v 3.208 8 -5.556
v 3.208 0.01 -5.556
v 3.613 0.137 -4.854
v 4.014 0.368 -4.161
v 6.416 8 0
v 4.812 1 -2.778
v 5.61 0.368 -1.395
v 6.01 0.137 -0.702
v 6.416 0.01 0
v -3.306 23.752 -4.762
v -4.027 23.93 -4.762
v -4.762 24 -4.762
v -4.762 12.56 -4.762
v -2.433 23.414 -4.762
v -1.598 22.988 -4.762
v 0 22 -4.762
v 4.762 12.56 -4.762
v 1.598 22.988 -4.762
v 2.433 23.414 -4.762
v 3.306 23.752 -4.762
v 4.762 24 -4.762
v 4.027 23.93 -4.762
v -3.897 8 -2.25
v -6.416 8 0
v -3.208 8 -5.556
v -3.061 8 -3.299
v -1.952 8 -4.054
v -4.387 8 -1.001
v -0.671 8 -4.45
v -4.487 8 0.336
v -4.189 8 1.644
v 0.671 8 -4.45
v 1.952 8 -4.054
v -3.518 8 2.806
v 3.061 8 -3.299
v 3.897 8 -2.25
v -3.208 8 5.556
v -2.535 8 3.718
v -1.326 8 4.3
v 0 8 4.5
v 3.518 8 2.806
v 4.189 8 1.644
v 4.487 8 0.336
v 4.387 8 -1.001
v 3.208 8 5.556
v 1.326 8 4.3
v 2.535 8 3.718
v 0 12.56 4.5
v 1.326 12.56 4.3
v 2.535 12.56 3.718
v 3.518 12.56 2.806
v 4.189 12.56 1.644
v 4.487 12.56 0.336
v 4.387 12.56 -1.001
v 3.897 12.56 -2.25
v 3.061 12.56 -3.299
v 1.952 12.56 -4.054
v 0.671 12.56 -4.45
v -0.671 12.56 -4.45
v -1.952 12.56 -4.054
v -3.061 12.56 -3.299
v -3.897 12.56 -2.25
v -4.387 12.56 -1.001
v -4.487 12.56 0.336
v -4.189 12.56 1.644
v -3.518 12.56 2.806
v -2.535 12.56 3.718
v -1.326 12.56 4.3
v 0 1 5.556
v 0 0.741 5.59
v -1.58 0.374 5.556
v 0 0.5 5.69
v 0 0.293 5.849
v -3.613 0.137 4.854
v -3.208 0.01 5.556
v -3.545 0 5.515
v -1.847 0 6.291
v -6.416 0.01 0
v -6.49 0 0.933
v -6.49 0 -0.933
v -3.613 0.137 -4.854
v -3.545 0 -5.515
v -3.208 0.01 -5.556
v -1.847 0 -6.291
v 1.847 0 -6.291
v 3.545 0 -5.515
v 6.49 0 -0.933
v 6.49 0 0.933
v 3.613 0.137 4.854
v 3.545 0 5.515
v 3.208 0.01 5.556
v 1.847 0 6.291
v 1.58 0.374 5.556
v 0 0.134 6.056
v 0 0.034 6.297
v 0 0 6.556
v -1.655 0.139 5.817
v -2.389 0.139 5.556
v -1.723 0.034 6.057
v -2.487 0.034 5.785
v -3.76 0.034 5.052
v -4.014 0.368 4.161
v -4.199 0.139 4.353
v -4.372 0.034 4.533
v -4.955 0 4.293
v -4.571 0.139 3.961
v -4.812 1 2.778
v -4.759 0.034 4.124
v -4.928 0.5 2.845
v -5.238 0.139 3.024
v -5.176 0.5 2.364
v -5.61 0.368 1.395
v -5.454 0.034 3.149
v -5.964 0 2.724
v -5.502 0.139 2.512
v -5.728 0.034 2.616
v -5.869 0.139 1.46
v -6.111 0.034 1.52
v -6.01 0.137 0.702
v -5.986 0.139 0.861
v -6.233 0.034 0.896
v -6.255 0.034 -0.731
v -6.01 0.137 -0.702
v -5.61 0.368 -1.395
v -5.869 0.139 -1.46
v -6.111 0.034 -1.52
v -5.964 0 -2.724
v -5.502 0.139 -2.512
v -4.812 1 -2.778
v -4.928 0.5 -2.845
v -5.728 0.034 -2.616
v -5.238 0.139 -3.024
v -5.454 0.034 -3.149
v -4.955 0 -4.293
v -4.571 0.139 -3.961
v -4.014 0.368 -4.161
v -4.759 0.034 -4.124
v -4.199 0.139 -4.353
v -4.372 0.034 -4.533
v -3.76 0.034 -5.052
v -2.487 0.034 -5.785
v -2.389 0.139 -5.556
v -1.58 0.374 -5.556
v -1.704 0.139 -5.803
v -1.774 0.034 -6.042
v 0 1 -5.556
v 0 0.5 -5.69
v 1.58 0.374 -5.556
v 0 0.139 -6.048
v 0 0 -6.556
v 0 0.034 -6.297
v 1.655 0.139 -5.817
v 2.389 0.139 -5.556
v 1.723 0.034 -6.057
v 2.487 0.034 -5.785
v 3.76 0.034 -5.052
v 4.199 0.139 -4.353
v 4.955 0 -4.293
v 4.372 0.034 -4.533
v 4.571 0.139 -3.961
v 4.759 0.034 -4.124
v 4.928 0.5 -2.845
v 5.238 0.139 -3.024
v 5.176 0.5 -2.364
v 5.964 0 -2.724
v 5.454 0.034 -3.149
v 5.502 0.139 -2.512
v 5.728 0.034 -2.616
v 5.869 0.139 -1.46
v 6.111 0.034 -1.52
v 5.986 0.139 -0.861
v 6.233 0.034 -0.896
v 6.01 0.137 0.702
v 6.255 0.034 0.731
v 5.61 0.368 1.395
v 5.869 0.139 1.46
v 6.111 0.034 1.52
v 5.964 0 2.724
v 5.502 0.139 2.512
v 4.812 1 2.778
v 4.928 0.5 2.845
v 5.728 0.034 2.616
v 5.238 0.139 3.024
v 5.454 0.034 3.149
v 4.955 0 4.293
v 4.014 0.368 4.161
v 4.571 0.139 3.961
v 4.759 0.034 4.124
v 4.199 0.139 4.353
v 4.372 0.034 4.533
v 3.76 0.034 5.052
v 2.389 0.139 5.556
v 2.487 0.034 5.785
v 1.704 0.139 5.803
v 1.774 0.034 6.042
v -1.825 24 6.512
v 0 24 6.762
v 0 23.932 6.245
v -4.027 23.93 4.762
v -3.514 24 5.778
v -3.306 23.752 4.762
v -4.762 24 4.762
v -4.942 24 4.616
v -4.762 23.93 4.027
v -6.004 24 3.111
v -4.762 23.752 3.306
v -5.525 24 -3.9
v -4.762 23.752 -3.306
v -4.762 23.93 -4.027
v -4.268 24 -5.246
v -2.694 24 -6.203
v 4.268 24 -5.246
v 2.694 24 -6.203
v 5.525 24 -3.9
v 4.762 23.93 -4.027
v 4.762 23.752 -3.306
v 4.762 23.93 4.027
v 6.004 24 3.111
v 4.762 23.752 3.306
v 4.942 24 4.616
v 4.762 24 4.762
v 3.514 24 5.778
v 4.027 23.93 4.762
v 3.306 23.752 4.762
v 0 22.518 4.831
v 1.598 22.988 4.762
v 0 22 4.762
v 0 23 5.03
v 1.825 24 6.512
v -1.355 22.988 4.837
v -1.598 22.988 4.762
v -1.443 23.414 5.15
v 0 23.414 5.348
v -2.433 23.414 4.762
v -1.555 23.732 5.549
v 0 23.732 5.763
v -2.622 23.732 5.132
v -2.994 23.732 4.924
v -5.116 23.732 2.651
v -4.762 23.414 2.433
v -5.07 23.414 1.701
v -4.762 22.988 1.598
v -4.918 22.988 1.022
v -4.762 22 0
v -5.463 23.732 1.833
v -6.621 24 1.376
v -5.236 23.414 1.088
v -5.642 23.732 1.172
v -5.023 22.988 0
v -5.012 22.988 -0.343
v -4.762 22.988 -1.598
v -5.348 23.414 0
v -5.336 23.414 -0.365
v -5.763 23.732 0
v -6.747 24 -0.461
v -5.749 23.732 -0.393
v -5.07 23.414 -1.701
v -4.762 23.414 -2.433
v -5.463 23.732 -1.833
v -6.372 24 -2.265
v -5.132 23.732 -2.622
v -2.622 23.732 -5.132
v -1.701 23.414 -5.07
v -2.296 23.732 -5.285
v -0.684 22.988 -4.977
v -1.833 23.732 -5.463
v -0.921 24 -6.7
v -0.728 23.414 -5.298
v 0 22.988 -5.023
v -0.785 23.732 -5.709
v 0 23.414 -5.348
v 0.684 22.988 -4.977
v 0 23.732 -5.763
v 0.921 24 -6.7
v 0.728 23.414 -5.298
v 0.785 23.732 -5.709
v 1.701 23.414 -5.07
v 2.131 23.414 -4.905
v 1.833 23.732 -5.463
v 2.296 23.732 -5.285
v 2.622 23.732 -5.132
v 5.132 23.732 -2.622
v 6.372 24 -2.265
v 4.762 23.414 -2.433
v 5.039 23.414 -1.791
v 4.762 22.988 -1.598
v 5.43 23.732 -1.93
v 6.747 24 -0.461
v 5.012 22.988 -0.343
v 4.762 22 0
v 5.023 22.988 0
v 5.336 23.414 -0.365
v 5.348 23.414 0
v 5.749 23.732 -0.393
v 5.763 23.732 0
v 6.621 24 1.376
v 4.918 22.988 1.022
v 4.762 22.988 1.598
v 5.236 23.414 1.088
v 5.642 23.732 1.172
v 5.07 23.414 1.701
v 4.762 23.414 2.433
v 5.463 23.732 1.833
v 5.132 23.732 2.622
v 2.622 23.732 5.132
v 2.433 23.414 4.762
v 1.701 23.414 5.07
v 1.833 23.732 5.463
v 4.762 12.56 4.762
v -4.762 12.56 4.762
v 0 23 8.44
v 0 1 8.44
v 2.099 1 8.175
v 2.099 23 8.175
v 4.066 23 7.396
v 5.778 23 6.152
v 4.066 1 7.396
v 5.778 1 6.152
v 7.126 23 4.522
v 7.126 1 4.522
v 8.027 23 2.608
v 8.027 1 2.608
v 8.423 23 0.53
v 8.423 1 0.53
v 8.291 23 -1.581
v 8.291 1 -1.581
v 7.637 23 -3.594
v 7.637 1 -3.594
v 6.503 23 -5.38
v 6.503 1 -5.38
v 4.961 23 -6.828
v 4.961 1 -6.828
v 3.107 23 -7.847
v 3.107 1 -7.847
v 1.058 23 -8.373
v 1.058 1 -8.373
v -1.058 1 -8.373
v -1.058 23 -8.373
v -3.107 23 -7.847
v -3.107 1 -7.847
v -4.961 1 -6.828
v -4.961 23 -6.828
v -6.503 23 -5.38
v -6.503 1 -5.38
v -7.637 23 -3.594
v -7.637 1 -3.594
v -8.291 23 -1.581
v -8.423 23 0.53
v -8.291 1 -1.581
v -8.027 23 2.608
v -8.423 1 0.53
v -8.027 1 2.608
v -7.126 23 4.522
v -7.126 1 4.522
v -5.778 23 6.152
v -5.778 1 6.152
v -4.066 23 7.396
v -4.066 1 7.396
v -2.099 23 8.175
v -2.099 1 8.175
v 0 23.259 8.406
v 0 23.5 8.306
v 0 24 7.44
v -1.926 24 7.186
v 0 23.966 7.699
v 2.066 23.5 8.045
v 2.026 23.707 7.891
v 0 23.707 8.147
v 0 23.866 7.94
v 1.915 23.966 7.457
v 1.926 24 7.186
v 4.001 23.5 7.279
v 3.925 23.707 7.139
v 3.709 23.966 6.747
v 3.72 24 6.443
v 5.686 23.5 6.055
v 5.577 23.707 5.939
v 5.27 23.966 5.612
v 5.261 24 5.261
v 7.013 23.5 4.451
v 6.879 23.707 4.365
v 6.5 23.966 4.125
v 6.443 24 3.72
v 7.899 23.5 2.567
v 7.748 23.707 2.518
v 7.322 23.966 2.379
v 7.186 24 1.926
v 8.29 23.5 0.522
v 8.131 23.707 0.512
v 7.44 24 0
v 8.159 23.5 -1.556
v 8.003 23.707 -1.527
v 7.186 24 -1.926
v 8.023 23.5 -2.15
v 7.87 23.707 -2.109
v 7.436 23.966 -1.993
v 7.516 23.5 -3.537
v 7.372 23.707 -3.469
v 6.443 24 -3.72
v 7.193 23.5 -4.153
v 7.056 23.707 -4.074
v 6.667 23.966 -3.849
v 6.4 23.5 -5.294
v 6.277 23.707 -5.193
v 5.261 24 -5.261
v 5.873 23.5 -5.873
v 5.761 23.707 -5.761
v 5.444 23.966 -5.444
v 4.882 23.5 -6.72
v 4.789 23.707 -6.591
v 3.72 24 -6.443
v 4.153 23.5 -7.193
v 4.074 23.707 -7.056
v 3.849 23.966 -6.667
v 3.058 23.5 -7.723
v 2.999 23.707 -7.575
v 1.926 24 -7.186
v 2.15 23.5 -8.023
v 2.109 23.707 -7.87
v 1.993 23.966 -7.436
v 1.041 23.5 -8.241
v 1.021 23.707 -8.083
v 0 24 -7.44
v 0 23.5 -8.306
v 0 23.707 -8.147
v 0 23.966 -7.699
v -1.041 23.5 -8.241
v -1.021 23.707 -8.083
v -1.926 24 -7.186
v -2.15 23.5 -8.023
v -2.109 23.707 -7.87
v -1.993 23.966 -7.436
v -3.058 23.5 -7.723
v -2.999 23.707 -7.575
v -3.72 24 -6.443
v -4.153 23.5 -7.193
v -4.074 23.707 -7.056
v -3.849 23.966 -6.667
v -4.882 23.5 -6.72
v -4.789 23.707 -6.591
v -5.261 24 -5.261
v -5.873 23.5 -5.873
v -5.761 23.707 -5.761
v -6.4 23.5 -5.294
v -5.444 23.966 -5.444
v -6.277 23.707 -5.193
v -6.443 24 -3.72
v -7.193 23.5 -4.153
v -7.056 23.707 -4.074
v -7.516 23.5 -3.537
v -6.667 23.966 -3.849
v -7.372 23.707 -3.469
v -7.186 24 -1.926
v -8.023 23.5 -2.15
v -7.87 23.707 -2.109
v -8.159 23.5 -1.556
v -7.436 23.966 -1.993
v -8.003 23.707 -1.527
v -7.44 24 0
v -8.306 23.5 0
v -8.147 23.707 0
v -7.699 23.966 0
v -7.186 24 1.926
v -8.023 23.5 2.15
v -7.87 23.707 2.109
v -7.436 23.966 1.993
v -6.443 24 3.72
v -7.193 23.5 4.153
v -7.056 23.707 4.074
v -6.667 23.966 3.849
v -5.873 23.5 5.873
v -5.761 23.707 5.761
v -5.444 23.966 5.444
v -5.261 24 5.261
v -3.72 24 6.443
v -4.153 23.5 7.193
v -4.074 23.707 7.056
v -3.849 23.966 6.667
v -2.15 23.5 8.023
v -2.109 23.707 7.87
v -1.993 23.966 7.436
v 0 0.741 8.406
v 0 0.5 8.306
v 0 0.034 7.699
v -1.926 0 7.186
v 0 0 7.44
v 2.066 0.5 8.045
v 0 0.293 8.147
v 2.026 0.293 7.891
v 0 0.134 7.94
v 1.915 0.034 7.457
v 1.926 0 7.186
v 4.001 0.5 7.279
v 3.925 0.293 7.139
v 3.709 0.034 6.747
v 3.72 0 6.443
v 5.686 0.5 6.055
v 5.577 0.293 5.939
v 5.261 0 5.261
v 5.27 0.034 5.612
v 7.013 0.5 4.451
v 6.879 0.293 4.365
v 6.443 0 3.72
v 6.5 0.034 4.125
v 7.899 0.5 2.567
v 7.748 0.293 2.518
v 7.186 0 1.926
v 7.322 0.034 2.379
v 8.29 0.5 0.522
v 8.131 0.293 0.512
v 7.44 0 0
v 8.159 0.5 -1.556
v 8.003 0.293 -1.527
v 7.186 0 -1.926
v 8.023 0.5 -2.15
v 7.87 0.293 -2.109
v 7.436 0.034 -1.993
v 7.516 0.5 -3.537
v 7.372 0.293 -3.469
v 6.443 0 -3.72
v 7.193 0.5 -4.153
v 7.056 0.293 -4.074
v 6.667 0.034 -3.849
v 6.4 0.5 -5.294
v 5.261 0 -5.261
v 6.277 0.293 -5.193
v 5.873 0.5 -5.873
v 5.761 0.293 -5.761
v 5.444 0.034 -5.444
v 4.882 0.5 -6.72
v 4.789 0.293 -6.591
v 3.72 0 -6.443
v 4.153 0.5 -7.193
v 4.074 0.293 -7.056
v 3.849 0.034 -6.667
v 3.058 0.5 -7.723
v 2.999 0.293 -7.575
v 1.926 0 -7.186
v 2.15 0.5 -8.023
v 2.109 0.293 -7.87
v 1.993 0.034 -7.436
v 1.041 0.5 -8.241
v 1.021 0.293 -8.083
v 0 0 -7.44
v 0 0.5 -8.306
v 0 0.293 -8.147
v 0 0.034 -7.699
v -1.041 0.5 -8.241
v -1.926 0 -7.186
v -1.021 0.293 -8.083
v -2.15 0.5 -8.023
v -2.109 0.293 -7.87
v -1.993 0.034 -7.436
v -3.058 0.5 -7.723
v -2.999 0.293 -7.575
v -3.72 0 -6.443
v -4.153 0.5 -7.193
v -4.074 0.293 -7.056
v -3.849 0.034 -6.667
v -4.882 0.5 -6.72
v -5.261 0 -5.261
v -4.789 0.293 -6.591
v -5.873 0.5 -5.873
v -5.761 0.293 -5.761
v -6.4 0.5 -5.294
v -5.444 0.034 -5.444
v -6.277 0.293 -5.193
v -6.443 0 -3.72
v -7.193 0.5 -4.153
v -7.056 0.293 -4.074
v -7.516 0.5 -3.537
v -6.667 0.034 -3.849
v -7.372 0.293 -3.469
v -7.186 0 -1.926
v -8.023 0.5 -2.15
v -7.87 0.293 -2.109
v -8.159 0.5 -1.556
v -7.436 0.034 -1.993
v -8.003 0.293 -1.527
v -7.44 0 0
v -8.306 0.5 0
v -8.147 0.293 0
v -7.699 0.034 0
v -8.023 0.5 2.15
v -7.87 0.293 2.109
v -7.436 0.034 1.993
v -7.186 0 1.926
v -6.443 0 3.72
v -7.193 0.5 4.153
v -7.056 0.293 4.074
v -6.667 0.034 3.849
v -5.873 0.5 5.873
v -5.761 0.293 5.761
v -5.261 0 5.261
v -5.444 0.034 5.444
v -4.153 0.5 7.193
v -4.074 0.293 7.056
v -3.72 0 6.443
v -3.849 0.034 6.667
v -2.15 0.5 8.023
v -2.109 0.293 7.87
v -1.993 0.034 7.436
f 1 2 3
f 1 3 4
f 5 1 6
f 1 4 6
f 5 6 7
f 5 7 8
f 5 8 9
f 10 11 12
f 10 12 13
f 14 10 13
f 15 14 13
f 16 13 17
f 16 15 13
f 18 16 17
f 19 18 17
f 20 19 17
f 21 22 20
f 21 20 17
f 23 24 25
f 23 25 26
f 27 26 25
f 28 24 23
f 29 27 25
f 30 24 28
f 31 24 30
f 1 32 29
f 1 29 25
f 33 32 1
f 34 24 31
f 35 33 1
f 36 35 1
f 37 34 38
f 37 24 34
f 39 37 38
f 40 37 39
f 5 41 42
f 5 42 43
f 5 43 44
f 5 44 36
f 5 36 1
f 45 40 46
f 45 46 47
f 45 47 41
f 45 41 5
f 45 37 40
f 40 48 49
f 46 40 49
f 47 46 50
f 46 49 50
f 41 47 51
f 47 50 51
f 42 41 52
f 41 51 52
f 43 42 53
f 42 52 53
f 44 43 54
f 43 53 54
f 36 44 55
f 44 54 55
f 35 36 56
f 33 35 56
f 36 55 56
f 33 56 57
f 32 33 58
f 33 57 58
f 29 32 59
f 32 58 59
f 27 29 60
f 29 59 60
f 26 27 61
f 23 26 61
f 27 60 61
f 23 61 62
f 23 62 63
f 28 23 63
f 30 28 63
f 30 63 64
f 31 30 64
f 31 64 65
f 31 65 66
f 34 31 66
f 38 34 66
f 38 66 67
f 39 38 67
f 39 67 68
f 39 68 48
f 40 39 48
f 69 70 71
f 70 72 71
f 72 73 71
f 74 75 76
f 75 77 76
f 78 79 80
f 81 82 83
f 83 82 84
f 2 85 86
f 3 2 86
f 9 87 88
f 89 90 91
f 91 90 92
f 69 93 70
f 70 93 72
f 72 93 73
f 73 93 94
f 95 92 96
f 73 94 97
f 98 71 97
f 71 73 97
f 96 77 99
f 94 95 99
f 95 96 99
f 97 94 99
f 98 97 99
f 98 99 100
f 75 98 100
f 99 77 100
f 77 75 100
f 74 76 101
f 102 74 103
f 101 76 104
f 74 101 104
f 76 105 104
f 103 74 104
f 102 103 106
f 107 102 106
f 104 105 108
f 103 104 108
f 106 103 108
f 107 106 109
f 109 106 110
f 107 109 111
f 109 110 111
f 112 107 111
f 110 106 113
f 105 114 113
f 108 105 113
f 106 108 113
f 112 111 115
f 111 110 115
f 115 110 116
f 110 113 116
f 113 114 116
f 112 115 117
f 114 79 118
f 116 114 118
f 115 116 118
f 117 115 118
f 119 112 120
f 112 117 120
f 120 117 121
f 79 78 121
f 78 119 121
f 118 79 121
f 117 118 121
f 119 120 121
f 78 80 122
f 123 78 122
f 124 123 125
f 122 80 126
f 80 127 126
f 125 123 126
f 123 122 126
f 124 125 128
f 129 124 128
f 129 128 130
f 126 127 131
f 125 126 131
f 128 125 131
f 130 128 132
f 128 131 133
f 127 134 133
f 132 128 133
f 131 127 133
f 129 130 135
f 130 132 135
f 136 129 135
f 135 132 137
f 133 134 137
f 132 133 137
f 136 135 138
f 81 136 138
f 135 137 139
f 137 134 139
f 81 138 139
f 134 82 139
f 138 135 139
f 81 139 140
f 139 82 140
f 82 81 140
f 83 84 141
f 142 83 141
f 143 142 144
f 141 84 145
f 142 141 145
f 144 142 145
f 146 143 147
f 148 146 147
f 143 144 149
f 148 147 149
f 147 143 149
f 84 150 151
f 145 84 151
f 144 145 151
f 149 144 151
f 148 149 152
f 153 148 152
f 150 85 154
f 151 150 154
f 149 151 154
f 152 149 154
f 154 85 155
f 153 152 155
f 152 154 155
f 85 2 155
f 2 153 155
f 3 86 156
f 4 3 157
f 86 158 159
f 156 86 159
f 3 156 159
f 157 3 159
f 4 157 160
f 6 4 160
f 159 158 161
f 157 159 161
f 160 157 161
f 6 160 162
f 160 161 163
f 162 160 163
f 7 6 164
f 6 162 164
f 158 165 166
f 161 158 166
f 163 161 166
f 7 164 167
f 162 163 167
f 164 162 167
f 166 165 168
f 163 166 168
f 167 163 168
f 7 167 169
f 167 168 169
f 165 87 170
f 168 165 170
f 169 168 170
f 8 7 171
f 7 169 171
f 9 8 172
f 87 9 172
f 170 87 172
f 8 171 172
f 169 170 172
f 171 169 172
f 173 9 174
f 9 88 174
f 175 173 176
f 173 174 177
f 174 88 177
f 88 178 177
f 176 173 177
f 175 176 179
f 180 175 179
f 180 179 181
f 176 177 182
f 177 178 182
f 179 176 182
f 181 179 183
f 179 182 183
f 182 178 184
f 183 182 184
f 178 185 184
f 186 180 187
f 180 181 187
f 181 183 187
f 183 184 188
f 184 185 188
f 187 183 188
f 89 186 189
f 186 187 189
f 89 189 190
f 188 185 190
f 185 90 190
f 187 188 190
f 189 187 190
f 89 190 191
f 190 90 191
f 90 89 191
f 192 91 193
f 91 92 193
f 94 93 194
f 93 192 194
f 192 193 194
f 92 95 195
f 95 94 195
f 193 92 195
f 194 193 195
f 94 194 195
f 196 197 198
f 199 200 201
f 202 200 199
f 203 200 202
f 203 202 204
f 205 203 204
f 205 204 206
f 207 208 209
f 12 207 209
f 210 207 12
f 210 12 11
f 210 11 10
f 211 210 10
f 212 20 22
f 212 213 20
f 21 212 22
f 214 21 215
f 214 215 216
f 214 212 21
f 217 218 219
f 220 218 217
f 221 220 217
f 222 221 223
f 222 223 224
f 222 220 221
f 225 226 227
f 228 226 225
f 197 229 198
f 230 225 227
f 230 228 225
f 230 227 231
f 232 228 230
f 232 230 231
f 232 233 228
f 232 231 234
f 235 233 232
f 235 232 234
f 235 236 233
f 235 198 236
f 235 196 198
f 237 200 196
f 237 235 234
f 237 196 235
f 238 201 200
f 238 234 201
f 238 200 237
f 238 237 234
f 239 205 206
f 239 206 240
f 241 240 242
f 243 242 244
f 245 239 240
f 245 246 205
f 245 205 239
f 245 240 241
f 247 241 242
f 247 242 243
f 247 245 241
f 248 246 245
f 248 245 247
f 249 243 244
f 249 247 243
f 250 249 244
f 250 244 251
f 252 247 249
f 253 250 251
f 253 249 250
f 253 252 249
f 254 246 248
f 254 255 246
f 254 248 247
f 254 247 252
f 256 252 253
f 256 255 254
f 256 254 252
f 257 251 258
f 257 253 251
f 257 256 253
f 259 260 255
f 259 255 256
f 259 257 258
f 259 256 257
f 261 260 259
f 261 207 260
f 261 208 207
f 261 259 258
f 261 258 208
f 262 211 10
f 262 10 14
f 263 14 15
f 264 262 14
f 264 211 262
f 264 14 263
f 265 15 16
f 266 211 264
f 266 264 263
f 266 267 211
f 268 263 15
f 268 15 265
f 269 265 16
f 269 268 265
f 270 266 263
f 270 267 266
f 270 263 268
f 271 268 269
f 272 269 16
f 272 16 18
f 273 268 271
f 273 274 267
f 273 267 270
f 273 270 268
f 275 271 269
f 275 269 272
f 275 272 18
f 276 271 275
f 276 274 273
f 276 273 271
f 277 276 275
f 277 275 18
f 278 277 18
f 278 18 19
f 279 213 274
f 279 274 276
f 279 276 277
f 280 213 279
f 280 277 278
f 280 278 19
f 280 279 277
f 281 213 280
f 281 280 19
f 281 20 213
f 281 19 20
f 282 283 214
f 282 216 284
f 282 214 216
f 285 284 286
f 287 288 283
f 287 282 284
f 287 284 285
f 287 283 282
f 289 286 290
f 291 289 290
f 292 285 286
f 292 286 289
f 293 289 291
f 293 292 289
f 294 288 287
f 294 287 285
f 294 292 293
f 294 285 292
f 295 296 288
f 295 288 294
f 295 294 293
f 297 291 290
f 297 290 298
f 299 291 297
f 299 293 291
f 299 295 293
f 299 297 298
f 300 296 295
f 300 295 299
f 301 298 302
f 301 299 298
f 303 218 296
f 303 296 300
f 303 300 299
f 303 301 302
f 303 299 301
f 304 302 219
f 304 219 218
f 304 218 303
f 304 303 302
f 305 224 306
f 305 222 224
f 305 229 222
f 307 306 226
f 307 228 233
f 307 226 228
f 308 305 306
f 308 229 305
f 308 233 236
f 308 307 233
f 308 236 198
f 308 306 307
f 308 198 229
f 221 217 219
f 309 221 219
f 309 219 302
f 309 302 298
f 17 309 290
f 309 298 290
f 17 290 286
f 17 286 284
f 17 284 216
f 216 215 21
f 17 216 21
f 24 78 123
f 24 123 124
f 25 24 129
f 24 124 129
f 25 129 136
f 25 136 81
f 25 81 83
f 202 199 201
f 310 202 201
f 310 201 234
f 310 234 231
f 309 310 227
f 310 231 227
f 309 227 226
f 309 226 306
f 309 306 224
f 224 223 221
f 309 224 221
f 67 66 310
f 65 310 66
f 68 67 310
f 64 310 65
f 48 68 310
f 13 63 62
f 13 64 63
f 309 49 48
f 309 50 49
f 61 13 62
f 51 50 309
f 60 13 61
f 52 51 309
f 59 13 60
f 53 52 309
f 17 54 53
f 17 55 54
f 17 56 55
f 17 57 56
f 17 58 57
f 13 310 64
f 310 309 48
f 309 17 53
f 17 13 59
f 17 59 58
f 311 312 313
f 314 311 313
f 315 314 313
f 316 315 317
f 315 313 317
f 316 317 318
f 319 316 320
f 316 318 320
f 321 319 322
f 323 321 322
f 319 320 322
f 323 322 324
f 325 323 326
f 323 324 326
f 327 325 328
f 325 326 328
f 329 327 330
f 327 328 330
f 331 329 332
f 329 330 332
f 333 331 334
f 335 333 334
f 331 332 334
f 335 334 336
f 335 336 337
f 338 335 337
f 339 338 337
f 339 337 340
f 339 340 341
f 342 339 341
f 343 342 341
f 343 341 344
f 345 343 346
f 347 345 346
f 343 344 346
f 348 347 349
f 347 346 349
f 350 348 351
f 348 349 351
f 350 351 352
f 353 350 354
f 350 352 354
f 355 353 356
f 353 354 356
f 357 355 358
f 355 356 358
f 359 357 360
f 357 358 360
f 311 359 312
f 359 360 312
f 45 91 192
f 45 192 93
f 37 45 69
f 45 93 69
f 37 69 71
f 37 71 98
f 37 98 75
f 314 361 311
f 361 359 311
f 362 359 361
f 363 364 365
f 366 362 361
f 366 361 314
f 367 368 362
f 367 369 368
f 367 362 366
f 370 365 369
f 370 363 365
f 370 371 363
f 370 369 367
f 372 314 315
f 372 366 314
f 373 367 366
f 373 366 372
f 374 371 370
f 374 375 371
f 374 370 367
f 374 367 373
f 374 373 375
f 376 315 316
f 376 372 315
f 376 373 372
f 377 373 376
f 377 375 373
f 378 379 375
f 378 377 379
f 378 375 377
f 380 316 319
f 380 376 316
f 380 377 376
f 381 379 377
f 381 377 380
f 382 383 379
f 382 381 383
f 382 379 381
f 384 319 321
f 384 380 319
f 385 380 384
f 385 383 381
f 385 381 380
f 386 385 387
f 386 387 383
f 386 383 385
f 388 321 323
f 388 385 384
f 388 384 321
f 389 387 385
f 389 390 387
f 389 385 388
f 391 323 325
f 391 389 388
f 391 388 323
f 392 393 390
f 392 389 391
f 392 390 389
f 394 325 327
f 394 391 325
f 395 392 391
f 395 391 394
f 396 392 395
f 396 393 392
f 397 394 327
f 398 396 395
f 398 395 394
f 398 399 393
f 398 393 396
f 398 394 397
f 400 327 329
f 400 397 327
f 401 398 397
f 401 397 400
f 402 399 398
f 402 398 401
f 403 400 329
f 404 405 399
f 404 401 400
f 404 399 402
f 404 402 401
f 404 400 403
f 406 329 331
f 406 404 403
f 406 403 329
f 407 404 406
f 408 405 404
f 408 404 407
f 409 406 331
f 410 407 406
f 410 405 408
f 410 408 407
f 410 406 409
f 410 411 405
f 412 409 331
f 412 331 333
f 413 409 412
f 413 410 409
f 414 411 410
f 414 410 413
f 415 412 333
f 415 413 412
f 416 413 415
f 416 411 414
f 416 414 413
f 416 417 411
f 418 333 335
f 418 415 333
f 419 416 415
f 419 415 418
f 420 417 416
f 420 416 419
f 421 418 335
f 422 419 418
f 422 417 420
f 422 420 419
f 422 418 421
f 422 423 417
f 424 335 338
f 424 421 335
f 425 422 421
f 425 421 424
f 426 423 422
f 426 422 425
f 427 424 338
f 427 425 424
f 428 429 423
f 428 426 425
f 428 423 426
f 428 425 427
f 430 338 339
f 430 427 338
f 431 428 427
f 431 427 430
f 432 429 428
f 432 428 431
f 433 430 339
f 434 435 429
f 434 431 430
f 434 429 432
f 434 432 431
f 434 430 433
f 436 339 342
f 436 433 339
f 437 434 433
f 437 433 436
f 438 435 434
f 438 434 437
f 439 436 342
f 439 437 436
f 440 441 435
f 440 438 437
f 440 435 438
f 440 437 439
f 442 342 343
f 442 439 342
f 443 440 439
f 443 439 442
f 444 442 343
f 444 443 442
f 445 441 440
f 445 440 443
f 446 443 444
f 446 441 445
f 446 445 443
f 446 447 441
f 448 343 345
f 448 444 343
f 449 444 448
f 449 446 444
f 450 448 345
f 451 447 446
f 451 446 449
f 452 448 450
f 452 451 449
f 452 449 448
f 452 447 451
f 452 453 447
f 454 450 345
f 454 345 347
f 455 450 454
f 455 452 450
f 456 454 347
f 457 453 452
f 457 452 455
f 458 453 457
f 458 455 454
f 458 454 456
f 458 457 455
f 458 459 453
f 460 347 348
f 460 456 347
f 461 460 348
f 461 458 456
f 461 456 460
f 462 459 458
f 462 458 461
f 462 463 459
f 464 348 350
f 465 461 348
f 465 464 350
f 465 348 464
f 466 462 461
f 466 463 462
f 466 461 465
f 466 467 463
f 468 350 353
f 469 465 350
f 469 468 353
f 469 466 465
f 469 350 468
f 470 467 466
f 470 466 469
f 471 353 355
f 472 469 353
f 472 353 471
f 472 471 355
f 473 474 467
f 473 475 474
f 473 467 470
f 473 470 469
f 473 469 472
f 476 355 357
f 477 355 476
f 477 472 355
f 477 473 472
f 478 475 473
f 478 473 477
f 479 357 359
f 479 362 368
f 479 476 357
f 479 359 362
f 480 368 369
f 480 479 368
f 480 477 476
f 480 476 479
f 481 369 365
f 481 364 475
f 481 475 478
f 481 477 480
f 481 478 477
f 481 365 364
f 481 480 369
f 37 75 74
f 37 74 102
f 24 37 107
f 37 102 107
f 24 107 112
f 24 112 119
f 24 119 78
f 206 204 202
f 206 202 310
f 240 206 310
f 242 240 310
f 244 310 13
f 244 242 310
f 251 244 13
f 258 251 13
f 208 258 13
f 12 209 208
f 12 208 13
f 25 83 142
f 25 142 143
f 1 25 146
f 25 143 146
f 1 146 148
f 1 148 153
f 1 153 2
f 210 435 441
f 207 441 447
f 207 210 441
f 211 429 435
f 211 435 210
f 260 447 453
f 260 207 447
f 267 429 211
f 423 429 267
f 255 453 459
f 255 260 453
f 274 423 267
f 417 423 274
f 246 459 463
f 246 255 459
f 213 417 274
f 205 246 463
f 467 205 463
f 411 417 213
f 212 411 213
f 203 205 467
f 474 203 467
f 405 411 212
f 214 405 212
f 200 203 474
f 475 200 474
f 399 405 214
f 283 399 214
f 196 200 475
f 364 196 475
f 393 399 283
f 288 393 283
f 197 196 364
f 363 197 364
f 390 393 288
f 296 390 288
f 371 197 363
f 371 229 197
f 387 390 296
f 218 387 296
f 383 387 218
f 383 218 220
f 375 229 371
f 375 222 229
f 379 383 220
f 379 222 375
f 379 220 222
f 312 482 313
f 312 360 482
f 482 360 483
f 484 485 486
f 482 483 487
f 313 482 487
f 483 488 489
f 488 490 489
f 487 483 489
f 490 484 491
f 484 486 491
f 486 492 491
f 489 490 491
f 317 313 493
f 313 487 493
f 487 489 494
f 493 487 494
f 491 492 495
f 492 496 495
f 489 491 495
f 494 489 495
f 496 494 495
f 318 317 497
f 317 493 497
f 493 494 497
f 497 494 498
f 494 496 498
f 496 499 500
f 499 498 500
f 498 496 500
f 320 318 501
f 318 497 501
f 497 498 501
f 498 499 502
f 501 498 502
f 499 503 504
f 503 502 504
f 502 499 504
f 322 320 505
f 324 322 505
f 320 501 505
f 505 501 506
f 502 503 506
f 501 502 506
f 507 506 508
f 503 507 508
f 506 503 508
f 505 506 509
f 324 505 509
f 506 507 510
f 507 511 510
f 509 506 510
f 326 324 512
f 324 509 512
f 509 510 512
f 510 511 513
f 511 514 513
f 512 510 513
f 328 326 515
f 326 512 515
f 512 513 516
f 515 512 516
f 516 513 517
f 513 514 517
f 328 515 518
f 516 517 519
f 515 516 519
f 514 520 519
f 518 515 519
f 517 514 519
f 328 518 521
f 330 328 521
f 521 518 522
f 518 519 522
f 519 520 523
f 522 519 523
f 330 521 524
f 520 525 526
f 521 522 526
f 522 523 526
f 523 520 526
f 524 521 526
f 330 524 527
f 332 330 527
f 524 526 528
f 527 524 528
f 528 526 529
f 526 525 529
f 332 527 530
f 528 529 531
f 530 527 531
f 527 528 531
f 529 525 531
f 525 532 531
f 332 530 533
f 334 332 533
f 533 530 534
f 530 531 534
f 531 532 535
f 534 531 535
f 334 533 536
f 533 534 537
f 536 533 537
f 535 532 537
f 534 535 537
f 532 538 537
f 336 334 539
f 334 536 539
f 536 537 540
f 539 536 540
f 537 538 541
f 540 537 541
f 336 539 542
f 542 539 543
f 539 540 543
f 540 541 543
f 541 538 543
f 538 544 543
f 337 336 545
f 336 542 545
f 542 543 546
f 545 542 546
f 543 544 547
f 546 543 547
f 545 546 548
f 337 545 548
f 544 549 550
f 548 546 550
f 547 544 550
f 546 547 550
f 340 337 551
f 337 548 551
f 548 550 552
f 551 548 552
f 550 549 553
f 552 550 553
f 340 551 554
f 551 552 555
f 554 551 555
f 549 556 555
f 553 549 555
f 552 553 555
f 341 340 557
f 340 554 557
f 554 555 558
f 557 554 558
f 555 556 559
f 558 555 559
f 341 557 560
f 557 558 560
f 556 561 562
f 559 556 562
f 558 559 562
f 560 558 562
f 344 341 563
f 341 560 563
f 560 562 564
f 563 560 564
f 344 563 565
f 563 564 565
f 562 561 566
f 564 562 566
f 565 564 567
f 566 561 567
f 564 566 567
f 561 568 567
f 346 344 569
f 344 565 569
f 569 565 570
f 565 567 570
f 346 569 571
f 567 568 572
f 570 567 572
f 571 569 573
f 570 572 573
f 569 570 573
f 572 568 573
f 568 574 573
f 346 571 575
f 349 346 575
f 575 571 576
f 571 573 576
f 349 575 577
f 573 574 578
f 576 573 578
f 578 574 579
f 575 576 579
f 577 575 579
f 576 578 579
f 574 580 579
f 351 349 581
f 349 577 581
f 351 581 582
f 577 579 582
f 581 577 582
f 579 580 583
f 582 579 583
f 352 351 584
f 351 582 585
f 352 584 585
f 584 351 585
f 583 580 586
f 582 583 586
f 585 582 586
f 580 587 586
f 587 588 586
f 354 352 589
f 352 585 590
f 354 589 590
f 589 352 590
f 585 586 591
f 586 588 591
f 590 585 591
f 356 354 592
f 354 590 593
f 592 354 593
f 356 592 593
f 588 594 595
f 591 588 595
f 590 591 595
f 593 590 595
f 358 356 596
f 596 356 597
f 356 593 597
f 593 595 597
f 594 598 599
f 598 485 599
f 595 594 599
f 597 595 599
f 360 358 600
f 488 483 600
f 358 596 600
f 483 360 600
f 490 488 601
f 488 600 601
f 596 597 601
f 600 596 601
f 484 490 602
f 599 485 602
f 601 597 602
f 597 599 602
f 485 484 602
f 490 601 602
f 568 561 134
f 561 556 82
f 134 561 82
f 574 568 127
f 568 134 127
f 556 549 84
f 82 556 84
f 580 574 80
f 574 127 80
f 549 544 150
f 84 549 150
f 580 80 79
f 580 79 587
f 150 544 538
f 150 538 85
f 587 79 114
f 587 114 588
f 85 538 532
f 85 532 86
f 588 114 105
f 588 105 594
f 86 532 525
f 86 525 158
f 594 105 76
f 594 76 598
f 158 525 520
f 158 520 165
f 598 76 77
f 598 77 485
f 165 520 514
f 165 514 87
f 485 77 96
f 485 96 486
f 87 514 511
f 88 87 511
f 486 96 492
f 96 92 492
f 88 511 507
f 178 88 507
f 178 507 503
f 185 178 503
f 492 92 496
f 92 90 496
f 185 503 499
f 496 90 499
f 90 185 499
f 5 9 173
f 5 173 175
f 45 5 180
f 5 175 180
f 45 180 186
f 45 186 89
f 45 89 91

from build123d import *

# Parameters (mm, degrees)
SKETCH1_R           = 8.44
BOSS_EXTRUDE1_DEPTH = 24
SKETCH2_W           = 9.525
SKETCH2_H           = 9.525
CUT_EXTRUDE1_DEPTH  = 11.44
SKETCH3_R           = 4.5
CUT_EXTRUDE2_DEPTH  = 18.32688085
CUT_EXTRUDE3_DEPTH  = 8
FILLET1_R           = 1


with BuildPart() as part:
    # Sketch1 → Boss-Extrude1 (new body)
    with BuildSketch(Plane(origin=(0, 0, 0), x_dir=(1, 0, 0), z_dir=(0, 1, 0))):
        with Locations(Location((0, 0, 0), (0, 0, 270))):
            Circle(SKETCH1_R)
    extrude(amount=BOSS_EXTRUDE1_DEPTH)

    # Sketch2 → Cut-Extrude1 (cut)
    with BuildSketch(Plane(origin=(0, 24, 0), x_dir=(1, 0, 0), z_dir=(0, 1, 0))):
        Rectangle(SKETCH2_W, SKETCH2_H)
    extrude(amount=-CUT_EXTRUDE1_DEPTH, mode=Mode.SUBTRACT)

    # Sketch3 → Cut-Extrude2 (cut, through all)
    with BuildSketch(Plane(origin=(0, 12.56, 0), x_dir=(1, 0, 0), z_dir=(0, 1, 0))):
        with Locations(Location((0, 0, 0), (0, 0, 270))):
            Circle(SKETCH3_R)
    extrude(amount=-CUT_EXTRUDE2_DEPTH, mode=Mode.SUBTRACT)

    # Sketch4 → Cut-Extrude3 (cut)
    with BuildSketch(Plane.XZ):
        Polygon((-3.207902433, 5.55625), (-6.415804866, 0), (-3.207902433, -5.55625), (3.207902433, -5.55625), (6.415804866, 0), (3.207902433, 5.55625), align=None)
    extrude(amount=-CUT_EXTRUDE3_DEPTH, mode=Mode.SUBTRACT)

    # Sketch5 → Cut-Revolve1 (revolve, cut)
    with BuildSketch(Plane(origin=(0, 0, 0), x_dir=(0, 0, -1), z_dir=(1, 0, 0))):
        with BuildLine():
            Line((-6.55625, 0), (-5.55625, 0))
            Line((-5.55625, 0), (-5.55625, 1))
            ThreePointArc((-5.55625, 1), (-5.849143219, 0.292893219), (-6.55625, 0))
        make_face()
        with BuildLine():
            Line((-6.7625, 24), (-4.7625, 24))
            Line((-4.7625, 24), (-4.7625, 22))
            ThreePointArc((-4.7625, 22), (-5.348286438, 23.414213562), (-6.7625, 24))
        make_face()
    revolve(axis=Axis((0, 24, 0), (0, -1, 0)), mode=Mode.SUBTRACT)

    # Fillet1
    fillet1_edges = [part.edges().sort_by_distance(p)[0] for p in [
        (0, 0, -8.44),
        (0, 24, -8.44),
    ]]
    fillet(fillet1_edges, radius=FILLET1_R)


solid = part.part
